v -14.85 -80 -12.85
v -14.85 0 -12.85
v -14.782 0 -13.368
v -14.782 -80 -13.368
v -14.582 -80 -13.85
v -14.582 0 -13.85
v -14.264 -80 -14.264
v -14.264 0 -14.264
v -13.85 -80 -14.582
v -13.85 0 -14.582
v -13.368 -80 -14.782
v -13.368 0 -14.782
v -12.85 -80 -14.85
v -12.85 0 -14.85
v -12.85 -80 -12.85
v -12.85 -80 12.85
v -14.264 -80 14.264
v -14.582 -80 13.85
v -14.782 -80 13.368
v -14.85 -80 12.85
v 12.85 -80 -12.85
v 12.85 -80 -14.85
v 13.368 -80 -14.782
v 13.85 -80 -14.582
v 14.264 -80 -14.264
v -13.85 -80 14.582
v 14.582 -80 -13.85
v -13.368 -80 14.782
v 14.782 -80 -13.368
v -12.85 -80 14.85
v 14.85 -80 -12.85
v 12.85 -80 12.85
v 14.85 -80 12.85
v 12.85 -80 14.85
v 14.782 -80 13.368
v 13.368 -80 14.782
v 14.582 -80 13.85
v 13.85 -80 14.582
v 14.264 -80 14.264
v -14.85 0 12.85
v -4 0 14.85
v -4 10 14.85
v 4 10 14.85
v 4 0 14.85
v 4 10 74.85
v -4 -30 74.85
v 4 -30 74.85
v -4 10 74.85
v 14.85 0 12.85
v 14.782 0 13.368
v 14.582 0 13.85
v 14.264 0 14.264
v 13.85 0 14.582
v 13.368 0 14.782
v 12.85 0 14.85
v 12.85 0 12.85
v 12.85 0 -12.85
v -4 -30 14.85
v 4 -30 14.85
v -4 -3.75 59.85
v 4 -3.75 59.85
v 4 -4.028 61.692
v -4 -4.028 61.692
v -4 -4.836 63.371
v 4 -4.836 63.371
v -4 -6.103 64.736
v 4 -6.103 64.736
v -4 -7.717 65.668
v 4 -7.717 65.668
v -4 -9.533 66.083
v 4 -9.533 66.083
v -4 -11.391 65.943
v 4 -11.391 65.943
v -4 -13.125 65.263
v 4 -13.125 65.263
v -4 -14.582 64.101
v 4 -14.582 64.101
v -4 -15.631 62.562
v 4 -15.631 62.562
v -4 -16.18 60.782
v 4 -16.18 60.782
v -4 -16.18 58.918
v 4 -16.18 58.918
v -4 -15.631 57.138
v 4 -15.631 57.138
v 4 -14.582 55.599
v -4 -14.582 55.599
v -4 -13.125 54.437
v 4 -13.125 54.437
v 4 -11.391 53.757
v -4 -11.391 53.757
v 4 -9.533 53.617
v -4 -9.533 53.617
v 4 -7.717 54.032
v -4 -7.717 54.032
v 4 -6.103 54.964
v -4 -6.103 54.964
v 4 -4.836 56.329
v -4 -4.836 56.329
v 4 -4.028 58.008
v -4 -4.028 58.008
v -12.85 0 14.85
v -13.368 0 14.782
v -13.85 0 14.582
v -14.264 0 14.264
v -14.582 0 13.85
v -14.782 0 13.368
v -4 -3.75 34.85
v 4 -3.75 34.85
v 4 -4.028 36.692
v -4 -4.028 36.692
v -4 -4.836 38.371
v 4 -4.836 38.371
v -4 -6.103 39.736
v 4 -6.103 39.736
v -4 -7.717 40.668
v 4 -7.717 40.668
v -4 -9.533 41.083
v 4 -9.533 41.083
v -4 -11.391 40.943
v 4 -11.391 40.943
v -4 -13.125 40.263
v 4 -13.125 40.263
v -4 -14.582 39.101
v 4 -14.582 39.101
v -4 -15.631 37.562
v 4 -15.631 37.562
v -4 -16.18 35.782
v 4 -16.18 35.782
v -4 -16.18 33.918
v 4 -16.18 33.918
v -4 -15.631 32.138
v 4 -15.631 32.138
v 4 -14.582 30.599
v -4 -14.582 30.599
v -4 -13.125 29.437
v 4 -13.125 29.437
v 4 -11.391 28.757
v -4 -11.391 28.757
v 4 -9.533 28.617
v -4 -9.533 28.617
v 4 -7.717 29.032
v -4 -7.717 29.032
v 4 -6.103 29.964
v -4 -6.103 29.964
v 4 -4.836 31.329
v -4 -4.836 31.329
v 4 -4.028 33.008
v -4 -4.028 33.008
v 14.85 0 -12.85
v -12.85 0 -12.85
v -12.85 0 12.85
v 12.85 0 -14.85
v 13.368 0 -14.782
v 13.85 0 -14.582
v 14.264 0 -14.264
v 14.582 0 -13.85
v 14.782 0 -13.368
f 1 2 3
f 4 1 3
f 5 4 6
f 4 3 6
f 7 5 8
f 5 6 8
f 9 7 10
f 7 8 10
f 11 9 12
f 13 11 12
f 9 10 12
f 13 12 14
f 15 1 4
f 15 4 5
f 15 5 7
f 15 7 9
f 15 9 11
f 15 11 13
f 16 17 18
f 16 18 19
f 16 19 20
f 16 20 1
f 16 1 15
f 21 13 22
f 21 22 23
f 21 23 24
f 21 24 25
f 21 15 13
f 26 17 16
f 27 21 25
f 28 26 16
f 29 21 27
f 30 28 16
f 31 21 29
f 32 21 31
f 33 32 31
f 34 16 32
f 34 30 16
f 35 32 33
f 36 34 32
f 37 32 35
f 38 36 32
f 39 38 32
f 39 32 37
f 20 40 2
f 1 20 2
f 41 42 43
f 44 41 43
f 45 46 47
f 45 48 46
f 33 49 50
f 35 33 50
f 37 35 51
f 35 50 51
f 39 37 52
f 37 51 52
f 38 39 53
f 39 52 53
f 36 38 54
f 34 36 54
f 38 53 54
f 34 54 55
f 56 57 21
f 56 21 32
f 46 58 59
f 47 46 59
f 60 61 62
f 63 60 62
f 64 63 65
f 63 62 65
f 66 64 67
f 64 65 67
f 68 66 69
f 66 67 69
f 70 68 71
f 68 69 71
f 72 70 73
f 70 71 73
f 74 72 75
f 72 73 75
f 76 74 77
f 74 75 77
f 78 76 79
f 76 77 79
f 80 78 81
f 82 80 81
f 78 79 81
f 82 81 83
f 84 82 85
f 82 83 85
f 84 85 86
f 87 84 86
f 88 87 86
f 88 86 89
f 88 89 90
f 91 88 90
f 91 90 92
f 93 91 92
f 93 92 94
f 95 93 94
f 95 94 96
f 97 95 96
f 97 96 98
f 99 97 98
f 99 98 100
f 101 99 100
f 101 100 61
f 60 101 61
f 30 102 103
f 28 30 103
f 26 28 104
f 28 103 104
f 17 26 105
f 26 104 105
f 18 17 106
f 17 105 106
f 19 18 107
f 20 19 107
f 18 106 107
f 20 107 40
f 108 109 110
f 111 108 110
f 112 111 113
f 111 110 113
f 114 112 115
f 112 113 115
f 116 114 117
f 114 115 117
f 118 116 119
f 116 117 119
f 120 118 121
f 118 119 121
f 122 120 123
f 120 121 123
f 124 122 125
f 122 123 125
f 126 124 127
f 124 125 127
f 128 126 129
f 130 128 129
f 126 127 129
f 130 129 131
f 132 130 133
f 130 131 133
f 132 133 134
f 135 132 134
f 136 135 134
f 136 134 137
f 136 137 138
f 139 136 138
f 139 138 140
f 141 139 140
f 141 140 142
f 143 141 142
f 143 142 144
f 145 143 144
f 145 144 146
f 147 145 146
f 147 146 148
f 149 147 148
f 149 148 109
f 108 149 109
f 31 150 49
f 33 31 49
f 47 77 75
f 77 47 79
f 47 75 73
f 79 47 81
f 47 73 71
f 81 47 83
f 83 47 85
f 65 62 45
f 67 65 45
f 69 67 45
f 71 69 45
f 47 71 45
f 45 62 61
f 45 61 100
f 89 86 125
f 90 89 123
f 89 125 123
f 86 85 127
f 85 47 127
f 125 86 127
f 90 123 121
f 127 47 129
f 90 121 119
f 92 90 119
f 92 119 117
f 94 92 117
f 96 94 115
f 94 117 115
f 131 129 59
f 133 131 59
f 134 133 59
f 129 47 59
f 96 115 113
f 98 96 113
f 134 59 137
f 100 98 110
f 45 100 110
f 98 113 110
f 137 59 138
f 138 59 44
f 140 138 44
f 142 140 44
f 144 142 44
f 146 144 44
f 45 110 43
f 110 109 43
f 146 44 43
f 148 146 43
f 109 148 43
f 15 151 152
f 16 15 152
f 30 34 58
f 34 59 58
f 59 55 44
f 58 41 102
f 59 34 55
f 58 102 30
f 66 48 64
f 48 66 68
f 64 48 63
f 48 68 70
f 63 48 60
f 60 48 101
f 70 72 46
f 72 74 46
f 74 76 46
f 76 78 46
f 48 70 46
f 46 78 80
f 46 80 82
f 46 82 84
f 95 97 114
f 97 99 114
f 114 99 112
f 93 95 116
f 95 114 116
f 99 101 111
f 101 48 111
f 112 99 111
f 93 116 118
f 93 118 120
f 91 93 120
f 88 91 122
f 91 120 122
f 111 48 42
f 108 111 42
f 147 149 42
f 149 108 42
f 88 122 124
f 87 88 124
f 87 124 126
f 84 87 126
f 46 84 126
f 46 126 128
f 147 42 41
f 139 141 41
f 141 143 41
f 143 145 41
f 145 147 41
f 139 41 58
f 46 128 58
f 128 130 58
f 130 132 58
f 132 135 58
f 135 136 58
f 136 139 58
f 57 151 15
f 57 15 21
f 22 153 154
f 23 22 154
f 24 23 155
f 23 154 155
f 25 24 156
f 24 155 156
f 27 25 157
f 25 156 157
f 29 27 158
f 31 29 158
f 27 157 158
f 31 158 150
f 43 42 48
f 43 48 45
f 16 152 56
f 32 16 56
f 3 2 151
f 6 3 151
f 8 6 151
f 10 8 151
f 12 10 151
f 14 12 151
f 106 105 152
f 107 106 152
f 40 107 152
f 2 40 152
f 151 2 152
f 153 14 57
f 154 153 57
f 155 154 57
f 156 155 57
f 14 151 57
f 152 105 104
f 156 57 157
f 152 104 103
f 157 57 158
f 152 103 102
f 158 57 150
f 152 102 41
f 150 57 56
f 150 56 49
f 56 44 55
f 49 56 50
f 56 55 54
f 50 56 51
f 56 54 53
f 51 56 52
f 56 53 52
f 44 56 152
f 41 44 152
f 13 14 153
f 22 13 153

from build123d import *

# Parameters (mm, degrees)
F0_W     = 25.7
F0_H     = 25.7
F1_DEPTH = 80
F2_W     = 8
F2_H     = 30
F2_H_2   = 10
F3_DEPTH = 60
F4_R     = 6.25
F5_DEPTH = 25


with BuildPart() as f1:
    # F0 (on Front) → F1 (new body)
    with BuildSketch(Plane.XZ):
        with BuildLine():
            Line((-12.85, -14.85), (12.85, -14.85))
            ThreePointArc((12.85, -14.85), (14.264214, -14.264214), (14.85, -12.85))
            Line((14.85, -12.85), (14.85, 12.85))
            ThreePointArc((14.85, 12.85), (14.264214, 14.264214), (12.85, 14.85))
            Line((12.85, 14.85), (-12.85, 14.85))
            ThreePointArc((-12.85, 14.85), (-14.264214, 14.264214), (-14.85, 12.85))
            Line((-14.85, 12.85), (-14.85, -12.85))
            ThreePointArc((-14.85, -12.85), (-14.264214, -14.264214), (-12.85, -14.85))
        make_face()
        Rectangle(F0_W, F0_H, mode=Mode.SUBTRACT)
    extrude(amount=F1_DEPTH)

    # F2 (on face) → F3 (join)
    with BuildSketch(Plane.XY.offset(14.85)):
        with Locations((0, -15)):
            Rectangle(F2_W, F2_H)
        with Locations((0, 5)):
            Rectangle(F2_W, F2_H_2)
    extrude(amount=F3_DEPTH)

    # F4 (on face) → F5 (cut)
    with BuildSketch(Plane.YZ.offset(4)):
        with Locations((-10, 34.85)):
            Circle(F4_R)
        with Locations((-10, 59.85)):
            Circle(F4_R)
    extrude(amount=-F5_DEPTH, mode=Mode.SUBTRACT)


solid = f1.part
